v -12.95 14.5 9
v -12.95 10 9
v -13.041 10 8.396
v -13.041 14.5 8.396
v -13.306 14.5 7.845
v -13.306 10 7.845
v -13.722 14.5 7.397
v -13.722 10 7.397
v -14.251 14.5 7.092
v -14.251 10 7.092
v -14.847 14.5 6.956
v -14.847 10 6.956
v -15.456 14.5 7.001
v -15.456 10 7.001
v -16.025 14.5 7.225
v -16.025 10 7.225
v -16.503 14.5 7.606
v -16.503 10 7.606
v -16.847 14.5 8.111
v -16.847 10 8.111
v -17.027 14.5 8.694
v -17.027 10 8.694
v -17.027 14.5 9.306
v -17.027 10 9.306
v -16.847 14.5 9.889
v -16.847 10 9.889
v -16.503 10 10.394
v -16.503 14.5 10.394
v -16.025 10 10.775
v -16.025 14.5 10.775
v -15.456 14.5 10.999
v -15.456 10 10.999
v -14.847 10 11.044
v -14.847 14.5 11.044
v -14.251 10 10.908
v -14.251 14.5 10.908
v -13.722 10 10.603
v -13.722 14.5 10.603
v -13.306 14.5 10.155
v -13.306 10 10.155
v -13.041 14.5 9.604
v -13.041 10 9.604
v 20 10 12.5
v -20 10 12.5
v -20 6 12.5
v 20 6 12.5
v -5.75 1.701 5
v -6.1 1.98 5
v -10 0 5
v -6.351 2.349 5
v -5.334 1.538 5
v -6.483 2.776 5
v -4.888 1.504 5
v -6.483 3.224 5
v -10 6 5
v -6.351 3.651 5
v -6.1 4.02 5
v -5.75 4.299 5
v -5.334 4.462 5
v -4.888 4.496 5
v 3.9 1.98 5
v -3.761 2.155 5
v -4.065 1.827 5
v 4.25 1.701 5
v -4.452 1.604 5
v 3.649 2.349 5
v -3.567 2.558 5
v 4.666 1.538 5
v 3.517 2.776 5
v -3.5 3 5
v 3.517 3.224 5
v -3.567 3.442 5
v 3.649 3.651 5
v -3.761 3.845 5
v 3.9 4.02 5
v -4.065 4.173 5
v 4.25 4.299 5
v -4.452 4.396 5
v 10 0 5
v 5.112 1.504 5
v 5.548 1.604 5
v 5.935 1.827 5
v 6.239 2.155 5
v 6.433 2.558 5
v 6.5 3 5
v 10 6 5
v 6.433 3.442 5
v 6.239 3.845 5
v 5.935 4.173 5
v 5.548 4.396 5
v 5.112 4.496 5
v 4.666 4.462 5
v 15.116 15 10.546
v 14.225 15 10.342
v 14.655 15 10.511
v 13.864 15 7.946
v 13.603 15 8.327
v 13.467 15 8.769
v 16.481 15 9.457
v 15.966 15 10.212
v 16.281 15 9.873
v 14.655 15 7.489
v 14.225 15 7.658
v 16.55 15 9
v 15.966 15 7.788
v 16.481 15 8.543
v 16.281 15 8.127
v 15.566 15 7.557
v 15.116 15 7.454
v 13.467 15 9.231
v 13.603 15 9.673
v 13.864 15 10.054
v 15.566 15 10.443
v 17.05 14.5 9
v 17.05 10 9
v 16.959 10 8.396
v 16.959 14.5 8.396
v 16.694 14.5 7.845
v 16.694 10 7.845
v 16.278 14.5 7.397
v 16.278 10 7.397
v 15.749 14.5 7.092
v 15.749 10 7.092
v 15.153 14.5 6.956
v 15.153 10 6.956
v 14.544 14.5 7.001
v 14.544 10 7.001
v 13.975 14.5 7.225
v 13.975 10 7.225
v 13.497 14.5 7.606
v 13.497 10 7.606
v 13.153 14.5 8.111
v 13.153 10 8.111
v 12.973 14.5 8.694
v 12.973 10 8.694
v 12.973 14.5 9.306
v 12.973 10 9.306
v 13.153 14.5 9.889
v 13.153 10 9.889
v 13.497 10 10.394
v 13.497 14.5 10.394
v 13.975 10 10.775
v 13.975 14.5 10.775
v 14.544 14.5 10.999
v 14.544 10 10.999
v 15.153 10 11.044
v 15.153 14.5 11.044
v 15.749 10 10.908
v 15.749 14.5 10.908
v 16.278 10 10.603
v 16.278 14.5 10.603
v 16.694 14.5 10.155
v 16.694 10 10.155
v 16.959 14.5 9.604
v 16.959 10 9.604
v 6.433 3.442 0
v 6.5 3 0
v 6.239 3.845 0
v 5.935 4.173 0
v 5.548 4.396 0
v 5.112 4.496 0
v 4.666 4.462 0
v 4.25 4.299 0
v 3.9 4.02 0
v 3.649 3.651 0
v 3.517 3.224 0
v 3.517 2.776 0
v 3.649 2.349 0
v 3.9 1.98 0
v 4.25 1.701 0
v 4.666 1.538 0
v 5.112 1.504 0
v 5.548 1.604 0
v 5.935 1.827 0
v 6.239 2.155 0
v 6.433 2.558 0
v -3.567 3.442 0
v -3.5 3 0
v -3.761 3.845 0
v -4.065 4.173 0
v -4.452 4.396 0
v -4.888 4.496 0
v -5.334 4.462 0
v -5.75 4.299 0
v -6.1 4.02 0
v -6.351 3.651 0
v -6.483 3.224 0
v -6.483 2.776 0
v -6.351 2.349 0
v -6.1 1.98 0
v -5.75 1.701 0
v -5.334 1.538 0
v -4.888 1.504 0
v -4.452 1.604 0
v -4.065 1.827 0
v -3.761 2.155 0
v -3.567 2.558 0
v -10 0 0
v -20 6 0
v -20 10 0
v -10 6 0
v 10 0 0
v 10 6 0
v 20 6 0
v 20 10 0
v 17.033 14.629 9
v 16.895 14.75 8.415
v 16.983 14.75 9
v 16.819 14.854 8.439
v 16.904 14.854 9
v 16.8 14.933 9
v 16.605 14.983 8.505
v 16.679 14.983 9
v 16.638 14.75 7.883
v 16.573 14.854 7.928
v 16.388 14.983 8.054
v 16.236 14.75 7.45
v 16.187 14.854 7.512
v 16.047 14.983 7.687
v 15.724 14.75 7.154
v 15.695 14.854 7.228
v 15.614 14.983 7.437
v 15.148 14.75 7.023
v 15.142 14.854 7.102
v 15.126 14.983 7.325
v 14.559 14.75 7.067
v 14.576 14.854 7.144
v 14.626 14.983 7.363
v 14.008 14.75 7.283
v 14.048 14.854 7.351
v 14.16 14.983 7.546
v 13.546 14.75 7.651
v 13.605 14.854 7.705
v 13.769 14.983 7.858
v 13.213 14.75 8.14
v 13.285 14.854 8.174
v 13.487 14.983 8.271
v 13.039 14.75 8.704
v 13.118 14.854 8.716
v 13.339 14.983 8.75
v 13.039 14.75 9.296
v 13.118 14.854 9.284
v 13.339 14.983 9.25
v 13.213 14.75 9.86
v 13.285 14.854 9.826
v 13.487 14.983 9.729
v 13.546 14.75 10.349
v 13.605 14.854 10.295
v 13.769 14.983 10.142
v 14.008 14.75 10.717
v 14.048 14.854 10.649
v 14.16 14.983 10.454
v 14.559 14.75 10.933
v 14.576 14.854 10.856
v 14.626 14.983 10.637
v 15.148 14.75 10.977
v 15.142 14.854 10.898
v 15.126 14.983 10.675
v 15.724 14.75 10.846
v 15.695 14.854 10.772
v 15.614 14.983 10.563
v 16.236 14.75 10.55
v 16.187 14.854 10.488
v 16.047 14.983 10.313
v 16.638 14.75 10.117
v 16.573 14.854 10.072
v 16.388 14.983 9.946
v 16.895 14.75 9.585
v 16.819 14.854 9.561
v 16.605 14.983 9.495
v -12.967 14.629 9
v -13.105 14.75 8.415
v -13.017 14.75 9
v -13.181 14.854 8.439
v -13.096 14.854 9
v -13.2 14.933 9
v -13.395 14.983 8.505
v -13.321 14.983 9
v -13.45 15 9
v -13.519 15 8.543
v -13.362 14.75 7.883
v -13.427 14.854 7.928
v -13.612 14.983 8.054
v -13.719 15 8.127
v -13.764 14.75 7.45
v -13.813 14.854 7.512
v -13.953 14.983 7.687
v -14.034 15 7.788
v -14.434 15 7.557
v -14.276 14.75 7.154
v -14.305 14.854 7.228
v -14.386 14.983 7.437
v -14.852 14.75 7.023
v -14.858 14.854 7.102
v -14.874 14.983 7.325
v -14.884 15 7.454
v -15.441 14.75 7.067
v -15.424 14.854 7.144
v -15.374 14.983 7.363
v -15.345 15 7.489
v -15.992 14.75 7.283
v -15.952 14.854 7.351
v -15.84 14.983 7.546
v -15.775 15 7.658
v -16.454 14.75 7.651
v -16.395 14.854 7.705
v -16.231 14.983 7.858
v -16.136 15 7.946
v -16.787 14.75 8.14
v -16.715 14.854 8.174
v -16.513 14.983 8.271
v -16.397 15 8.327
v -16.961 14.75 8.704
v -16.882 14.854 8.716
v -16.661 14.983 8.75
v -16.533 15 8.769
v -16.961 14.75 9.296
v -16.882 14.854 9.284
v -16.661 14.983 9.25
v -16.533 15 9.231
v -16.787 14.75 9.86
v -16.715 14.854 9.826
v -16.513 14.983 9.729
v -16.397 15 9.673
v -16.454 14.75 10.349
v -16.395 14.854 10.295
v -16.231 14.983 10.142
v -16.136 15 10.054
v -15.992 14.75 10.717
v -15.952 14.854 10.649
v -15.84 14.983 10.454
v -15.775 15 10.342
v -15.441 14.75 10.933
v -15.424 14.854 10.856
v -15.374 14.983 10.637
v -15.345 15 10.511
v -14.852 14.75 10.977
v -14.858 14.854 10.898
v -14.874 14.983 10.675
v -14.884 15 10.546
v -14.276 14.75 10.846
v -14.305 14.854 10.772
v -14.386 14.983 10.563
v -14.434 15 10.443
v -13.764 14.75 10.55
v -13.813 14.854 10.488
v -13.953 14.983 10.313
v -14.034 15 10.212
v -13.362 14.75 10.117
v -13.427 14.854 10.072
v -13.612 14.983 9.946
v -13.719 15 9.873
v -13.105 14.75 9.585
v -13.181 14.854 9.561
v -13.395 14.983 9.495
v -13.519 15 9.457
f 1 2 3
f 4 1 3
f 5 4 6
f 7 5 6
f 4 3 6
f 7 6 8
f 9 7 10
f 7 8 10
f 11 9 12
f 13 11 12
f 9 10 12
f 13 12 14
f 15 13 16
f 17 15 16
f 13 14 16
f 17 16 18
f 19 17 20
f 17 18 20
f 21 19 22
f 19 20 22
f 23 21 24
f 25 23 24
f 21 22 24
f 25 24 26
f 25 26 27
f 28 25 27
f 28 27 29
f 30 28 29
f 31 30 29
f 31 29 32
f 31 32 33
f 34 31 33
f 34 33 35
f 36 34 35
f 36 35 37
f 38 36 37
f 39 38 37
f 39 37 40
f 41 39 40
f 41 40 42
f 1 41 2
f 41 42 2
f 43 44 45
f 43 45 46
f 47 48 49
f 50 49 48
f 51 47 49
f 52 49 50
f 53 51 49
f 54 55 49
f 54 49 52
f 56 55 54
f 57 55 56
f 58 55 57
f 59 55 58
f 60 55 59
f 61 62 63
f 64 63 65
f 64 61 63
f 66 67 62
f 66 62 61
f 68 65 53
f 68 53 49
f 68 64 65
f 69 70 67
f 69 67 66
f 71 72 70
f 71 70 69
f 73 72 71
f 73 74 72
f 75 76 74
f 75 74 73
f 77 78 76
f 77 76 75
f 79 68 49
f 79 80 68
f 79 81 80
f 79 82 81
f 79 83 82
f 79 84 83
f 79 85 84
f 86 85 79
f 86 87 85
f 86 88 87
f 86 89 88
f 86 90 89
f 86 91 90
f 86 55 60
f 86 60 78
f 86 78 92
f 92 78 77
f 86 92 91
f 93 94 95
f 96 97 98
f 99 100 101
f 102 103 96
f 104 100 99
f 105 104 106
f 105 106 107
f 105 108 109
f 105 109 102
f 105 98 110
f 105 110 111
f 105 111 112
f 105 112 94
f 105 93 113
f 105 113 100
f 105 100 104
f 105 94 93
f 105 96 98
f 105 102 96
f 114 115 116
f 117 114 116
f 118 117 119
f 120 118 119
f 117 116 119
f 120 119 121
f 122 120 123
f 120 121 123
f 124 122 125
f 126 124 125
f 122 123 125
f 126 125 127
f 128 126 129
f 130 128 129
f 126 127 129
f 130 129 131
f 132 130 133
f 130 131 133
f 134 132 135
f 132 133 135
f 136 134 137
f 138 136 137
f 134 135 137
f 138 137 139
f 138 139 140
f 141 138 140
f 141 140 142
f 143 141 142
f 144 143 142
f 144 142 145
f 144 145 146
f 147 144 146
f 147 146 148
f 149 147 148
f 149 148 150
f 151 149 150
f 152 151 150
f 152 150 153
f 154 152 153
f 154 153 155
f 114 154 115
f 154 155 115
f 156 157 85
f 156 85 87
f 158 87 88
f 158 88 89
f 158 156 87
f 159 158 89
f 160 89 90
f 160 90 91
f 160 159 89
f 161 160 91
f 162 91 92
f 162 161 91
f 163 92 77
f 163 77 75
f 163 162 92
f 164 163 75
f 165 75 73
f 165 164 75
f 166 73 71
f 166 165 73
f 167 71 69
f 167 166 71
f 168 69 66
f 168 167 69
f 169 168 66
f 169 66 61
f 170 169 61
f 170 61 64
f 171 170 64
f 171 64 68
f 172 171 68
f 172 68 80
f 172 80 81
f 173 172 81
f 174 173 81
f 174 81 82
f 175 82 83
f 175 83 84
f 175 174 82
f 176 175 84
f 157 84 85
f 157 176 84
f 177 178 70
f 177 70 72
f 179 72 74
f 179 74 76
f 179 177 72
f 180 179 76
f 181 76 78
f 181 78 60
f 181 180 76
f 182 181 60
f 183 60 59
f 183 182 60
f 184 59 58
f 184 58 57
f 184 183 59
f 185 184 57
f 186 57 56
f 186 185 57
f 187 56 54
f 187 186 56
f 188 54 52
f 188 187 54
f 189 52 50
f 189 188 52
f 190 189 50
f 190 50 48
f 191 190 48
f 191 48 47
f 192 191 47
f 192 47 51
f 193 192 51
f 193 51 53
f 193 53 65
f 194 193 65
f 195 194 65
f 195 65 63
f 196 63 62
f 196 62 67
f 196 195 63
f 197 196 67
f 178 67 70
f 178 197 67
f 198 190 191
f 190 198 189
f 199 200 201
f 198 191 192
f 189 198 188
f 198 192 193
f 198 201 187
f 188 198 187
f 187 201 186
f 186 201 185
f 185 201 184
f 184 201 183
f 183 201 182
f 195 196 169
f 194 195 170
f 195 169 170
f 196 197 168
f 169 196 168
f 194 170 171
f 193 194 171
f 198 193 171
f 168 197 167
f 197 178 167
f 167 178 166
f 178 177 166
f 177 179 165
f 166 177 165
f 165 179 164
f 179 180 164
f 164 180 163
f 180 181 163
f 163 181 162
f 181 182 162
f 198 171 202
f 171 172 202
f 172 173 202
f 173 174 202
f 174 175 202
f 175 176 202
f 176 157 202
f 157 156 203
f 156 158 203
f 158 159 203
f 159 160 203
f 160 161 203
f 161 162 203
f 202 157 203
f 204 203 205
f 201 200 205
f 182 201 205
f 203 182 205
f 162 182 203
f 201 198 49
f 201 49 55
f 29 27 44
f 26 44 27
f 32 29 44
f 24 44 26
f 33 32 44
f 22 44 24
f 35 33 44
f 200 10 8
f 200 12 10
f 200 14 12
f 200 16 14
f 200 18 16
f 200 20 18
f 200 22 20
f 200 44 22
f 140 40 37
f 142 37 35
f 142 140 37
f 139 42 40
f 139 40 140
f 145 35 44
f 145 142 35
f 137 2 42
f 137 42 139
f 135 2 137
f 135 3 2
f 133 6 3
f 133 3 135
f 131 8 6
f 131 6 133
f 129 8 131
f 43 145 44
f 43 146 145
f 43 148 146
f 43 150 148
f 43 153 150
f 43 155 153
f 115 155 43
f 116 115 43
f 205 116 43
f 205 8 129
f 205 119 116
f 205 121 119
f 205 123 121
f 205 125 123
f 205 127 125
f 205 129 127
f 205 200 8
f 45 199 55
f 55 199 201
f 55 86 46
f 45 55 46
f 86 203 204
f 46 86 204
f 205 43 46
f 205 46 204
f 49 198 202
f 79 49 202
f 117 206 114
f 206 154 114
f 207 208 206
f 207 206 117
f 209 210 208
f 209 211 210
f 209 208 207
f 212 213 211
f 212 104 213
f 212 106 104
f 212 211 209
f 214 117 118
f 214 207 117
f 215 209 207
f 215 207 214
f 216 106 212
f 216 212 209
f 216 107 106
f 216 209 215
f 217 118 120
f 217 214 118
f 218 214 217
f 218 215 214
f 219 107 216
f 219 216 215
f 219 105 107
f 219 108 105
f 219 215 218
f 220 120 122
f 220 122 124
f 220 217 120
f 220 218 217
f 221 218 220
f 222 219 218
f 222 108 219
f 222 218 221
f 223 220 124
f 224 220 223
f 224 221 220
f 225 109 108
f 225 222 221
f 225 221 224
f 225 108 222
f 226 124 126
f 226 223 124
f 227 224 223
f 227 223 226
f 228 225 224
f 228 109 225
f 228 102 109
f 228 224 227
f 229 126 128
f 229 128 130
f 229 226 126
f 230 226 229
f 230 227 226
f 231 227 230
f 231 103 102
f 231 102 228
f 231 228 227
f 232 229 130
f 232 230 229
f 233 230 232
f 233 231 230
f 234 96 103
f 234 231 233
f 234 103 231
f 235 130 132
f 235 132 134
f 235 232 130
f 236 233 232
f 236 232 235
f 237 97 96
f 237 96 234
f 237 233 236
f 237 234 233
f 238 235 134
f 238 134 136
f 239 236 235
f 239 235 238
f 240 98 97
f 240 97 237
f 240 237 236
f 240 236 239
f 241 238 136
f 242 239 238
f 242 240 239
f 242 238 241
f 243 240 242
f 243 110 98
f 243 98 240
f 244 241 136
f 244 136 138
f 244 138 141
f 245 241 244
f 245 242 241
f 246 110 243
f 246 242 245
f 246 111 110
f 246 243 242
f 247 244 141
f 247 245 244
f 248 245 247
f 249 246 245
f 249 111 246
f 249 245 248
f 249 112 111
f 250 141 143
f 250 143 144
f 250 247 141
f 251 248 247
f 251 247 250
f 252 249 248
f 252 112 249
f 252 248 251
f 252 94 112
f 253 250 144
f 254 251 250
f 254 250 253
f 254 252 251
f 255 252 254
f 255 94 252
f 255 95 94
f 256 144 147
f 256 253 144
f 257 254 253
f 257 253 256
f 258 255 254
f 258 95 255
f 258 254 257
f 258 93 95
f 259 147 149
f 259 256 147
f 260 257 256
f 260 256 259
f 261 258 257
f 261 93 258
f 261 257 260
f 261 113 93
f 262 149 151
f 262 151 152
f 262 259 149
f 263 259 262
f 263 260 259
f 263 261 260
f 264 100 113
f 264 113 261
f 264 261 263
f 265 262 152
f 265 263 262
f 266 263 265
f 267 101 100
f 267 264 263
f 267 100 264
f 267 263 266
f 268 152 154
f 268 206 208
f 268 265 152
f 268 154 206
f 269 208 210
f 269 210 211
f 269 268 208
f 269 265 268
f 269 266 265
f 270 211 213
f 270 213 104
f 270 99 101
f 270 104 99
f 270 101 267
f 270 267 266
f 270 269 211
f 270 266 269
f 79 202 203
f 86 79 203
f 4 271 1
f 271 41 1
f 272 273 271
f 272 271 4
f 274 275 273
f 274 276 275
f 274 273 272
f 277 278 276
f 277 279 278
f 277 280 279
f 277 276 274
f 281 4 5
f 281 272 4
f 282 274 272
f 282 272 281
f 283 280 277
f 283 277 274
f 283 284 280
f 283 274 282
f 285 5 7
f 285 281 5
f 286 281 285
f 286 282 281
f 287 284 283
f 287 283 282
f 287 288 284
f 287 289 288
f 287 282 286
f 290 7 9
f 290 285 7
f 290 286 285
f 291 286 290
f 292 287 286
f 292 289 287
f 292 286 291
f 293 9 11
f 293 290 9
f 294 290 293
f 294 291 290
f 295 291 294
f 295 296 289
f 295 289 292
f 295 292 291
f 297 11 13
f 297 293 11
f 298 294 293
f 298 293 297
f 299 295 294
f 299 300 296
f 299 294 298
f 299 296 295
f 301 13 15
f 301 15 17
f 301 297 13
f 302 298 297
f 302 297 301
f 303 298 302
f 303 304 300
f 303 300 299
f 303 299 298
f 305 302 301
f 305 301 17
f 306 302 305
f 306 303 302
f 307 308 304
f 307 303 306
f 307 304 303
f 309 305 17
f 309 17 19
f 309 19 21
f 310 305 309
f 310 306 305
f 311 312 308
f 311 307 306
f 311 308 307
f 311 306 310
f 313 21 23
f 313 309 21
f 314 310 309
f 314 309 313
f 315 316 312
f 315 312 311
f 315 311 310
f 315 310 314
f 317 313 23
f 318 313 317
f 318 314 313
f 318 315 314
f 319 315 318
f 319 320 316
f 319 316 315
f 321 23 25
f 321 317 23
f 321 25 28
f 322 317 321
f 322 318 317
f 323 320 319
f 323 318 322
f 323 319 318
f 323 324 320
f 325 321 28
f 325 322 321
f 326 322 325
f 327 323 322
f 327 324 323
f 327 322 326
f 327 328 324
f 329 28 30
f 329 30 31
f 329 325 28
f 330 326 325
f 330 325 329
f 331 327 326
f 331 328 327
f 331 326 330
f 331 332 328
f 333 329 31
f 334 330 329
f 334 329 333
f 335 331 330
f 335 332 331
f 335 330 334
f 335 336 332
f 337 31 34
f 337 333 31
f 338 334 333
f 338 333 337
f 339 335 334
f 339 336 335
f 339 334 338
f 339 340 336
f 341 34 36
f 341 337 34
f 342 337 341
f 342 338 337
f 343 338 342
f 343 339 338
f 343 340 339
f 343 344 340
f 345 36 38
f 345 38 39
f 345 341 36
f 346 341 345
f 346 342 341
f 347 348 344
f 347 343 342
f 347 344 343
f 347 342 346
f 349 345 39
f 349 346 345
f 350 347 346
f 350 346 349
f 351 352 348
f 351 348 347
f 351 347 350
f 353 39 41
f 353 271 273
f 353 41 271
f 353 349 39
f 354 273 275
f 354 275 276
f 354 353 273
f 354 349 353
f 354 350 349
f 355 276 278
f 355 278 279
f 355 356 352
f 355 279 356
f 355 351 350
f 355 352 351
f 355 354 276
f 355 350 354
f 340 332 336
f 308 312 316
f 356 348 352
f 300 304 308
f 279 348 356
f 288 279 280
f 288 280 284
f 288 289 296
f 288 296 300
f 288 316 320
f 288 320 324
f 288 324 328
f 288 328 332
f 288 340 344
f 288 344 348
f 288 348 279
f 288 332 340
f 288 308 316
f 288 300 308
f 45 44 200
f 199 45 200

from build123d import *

# Parameters (mm, degrees)
SKETCH_1_W      = 20
SKETCH_1_H      = 10
SKETCH_1_R      = 1.5
EXTRUDE_1_DEPTH = 5
SKETCH_2_W      = 40
SKETCH_2_H      = 12.5
EXTRUDE_2_DEPTH = 4
SKETCH_3_R      = 2.05
EXTRUDE_3_DEPTH = 5
FILLET_1_R      = 0.5


with BuildPart() as part:
    # 草图1 → 凸台-拉伸1 (new body)
    with BuildSketch(Plane.XY):
        with Locations((0, 5)):
            Rectangle(SKETCH_1_W, SKETCH_1_H)
        with Locations((-5, 3)):
            Circle(SKETCH_1_R, mode=Mode.SUBTRACT)
        with Locations((5, 3)):
            Circle(SKETCH_1_R, mode=Mode.SUBTRACT)
    extrude(amount=EXTRUDE_1_DEPTH)

    # 草图2 → 凸台-拉伸2 (add)
    with BuildSketch(Plane(origin=(0, 10, 0), x_dir=(1, 0, 0), z_dir=(0, 1, 0))):
        with Locations((0, -6.25)):
            Rectangle(SKETCH_2_W, SKETCH_2_H)
    extrude(amount=-EXTRUDE_2_DEPTH)

    # 草图3 → 凸台-拉伸3 (add)
    with BuildSketch(Plane(origin=(0, 10, 0), x_dir=(1, 0, 0), z_dir=(0, 1, 0))):
        with Locations((-15, -9)):
            Circle(SKETCH_3_R)
        with Locations((15, -9)):
            Circle(SKETCH_3_R)
    extrude(amount=EXTRUDE_3_DEPTH)

    # 圆角1
    fillet_1_edges = [part.edges().sort_by_distance(p)[0] for p in [
        (-17.05, 15, 9),
        (12.95, 15, 9),
    ]]
    fillet(fillet_1_edges, radius=FILLET_1_R)


solid = part.part
